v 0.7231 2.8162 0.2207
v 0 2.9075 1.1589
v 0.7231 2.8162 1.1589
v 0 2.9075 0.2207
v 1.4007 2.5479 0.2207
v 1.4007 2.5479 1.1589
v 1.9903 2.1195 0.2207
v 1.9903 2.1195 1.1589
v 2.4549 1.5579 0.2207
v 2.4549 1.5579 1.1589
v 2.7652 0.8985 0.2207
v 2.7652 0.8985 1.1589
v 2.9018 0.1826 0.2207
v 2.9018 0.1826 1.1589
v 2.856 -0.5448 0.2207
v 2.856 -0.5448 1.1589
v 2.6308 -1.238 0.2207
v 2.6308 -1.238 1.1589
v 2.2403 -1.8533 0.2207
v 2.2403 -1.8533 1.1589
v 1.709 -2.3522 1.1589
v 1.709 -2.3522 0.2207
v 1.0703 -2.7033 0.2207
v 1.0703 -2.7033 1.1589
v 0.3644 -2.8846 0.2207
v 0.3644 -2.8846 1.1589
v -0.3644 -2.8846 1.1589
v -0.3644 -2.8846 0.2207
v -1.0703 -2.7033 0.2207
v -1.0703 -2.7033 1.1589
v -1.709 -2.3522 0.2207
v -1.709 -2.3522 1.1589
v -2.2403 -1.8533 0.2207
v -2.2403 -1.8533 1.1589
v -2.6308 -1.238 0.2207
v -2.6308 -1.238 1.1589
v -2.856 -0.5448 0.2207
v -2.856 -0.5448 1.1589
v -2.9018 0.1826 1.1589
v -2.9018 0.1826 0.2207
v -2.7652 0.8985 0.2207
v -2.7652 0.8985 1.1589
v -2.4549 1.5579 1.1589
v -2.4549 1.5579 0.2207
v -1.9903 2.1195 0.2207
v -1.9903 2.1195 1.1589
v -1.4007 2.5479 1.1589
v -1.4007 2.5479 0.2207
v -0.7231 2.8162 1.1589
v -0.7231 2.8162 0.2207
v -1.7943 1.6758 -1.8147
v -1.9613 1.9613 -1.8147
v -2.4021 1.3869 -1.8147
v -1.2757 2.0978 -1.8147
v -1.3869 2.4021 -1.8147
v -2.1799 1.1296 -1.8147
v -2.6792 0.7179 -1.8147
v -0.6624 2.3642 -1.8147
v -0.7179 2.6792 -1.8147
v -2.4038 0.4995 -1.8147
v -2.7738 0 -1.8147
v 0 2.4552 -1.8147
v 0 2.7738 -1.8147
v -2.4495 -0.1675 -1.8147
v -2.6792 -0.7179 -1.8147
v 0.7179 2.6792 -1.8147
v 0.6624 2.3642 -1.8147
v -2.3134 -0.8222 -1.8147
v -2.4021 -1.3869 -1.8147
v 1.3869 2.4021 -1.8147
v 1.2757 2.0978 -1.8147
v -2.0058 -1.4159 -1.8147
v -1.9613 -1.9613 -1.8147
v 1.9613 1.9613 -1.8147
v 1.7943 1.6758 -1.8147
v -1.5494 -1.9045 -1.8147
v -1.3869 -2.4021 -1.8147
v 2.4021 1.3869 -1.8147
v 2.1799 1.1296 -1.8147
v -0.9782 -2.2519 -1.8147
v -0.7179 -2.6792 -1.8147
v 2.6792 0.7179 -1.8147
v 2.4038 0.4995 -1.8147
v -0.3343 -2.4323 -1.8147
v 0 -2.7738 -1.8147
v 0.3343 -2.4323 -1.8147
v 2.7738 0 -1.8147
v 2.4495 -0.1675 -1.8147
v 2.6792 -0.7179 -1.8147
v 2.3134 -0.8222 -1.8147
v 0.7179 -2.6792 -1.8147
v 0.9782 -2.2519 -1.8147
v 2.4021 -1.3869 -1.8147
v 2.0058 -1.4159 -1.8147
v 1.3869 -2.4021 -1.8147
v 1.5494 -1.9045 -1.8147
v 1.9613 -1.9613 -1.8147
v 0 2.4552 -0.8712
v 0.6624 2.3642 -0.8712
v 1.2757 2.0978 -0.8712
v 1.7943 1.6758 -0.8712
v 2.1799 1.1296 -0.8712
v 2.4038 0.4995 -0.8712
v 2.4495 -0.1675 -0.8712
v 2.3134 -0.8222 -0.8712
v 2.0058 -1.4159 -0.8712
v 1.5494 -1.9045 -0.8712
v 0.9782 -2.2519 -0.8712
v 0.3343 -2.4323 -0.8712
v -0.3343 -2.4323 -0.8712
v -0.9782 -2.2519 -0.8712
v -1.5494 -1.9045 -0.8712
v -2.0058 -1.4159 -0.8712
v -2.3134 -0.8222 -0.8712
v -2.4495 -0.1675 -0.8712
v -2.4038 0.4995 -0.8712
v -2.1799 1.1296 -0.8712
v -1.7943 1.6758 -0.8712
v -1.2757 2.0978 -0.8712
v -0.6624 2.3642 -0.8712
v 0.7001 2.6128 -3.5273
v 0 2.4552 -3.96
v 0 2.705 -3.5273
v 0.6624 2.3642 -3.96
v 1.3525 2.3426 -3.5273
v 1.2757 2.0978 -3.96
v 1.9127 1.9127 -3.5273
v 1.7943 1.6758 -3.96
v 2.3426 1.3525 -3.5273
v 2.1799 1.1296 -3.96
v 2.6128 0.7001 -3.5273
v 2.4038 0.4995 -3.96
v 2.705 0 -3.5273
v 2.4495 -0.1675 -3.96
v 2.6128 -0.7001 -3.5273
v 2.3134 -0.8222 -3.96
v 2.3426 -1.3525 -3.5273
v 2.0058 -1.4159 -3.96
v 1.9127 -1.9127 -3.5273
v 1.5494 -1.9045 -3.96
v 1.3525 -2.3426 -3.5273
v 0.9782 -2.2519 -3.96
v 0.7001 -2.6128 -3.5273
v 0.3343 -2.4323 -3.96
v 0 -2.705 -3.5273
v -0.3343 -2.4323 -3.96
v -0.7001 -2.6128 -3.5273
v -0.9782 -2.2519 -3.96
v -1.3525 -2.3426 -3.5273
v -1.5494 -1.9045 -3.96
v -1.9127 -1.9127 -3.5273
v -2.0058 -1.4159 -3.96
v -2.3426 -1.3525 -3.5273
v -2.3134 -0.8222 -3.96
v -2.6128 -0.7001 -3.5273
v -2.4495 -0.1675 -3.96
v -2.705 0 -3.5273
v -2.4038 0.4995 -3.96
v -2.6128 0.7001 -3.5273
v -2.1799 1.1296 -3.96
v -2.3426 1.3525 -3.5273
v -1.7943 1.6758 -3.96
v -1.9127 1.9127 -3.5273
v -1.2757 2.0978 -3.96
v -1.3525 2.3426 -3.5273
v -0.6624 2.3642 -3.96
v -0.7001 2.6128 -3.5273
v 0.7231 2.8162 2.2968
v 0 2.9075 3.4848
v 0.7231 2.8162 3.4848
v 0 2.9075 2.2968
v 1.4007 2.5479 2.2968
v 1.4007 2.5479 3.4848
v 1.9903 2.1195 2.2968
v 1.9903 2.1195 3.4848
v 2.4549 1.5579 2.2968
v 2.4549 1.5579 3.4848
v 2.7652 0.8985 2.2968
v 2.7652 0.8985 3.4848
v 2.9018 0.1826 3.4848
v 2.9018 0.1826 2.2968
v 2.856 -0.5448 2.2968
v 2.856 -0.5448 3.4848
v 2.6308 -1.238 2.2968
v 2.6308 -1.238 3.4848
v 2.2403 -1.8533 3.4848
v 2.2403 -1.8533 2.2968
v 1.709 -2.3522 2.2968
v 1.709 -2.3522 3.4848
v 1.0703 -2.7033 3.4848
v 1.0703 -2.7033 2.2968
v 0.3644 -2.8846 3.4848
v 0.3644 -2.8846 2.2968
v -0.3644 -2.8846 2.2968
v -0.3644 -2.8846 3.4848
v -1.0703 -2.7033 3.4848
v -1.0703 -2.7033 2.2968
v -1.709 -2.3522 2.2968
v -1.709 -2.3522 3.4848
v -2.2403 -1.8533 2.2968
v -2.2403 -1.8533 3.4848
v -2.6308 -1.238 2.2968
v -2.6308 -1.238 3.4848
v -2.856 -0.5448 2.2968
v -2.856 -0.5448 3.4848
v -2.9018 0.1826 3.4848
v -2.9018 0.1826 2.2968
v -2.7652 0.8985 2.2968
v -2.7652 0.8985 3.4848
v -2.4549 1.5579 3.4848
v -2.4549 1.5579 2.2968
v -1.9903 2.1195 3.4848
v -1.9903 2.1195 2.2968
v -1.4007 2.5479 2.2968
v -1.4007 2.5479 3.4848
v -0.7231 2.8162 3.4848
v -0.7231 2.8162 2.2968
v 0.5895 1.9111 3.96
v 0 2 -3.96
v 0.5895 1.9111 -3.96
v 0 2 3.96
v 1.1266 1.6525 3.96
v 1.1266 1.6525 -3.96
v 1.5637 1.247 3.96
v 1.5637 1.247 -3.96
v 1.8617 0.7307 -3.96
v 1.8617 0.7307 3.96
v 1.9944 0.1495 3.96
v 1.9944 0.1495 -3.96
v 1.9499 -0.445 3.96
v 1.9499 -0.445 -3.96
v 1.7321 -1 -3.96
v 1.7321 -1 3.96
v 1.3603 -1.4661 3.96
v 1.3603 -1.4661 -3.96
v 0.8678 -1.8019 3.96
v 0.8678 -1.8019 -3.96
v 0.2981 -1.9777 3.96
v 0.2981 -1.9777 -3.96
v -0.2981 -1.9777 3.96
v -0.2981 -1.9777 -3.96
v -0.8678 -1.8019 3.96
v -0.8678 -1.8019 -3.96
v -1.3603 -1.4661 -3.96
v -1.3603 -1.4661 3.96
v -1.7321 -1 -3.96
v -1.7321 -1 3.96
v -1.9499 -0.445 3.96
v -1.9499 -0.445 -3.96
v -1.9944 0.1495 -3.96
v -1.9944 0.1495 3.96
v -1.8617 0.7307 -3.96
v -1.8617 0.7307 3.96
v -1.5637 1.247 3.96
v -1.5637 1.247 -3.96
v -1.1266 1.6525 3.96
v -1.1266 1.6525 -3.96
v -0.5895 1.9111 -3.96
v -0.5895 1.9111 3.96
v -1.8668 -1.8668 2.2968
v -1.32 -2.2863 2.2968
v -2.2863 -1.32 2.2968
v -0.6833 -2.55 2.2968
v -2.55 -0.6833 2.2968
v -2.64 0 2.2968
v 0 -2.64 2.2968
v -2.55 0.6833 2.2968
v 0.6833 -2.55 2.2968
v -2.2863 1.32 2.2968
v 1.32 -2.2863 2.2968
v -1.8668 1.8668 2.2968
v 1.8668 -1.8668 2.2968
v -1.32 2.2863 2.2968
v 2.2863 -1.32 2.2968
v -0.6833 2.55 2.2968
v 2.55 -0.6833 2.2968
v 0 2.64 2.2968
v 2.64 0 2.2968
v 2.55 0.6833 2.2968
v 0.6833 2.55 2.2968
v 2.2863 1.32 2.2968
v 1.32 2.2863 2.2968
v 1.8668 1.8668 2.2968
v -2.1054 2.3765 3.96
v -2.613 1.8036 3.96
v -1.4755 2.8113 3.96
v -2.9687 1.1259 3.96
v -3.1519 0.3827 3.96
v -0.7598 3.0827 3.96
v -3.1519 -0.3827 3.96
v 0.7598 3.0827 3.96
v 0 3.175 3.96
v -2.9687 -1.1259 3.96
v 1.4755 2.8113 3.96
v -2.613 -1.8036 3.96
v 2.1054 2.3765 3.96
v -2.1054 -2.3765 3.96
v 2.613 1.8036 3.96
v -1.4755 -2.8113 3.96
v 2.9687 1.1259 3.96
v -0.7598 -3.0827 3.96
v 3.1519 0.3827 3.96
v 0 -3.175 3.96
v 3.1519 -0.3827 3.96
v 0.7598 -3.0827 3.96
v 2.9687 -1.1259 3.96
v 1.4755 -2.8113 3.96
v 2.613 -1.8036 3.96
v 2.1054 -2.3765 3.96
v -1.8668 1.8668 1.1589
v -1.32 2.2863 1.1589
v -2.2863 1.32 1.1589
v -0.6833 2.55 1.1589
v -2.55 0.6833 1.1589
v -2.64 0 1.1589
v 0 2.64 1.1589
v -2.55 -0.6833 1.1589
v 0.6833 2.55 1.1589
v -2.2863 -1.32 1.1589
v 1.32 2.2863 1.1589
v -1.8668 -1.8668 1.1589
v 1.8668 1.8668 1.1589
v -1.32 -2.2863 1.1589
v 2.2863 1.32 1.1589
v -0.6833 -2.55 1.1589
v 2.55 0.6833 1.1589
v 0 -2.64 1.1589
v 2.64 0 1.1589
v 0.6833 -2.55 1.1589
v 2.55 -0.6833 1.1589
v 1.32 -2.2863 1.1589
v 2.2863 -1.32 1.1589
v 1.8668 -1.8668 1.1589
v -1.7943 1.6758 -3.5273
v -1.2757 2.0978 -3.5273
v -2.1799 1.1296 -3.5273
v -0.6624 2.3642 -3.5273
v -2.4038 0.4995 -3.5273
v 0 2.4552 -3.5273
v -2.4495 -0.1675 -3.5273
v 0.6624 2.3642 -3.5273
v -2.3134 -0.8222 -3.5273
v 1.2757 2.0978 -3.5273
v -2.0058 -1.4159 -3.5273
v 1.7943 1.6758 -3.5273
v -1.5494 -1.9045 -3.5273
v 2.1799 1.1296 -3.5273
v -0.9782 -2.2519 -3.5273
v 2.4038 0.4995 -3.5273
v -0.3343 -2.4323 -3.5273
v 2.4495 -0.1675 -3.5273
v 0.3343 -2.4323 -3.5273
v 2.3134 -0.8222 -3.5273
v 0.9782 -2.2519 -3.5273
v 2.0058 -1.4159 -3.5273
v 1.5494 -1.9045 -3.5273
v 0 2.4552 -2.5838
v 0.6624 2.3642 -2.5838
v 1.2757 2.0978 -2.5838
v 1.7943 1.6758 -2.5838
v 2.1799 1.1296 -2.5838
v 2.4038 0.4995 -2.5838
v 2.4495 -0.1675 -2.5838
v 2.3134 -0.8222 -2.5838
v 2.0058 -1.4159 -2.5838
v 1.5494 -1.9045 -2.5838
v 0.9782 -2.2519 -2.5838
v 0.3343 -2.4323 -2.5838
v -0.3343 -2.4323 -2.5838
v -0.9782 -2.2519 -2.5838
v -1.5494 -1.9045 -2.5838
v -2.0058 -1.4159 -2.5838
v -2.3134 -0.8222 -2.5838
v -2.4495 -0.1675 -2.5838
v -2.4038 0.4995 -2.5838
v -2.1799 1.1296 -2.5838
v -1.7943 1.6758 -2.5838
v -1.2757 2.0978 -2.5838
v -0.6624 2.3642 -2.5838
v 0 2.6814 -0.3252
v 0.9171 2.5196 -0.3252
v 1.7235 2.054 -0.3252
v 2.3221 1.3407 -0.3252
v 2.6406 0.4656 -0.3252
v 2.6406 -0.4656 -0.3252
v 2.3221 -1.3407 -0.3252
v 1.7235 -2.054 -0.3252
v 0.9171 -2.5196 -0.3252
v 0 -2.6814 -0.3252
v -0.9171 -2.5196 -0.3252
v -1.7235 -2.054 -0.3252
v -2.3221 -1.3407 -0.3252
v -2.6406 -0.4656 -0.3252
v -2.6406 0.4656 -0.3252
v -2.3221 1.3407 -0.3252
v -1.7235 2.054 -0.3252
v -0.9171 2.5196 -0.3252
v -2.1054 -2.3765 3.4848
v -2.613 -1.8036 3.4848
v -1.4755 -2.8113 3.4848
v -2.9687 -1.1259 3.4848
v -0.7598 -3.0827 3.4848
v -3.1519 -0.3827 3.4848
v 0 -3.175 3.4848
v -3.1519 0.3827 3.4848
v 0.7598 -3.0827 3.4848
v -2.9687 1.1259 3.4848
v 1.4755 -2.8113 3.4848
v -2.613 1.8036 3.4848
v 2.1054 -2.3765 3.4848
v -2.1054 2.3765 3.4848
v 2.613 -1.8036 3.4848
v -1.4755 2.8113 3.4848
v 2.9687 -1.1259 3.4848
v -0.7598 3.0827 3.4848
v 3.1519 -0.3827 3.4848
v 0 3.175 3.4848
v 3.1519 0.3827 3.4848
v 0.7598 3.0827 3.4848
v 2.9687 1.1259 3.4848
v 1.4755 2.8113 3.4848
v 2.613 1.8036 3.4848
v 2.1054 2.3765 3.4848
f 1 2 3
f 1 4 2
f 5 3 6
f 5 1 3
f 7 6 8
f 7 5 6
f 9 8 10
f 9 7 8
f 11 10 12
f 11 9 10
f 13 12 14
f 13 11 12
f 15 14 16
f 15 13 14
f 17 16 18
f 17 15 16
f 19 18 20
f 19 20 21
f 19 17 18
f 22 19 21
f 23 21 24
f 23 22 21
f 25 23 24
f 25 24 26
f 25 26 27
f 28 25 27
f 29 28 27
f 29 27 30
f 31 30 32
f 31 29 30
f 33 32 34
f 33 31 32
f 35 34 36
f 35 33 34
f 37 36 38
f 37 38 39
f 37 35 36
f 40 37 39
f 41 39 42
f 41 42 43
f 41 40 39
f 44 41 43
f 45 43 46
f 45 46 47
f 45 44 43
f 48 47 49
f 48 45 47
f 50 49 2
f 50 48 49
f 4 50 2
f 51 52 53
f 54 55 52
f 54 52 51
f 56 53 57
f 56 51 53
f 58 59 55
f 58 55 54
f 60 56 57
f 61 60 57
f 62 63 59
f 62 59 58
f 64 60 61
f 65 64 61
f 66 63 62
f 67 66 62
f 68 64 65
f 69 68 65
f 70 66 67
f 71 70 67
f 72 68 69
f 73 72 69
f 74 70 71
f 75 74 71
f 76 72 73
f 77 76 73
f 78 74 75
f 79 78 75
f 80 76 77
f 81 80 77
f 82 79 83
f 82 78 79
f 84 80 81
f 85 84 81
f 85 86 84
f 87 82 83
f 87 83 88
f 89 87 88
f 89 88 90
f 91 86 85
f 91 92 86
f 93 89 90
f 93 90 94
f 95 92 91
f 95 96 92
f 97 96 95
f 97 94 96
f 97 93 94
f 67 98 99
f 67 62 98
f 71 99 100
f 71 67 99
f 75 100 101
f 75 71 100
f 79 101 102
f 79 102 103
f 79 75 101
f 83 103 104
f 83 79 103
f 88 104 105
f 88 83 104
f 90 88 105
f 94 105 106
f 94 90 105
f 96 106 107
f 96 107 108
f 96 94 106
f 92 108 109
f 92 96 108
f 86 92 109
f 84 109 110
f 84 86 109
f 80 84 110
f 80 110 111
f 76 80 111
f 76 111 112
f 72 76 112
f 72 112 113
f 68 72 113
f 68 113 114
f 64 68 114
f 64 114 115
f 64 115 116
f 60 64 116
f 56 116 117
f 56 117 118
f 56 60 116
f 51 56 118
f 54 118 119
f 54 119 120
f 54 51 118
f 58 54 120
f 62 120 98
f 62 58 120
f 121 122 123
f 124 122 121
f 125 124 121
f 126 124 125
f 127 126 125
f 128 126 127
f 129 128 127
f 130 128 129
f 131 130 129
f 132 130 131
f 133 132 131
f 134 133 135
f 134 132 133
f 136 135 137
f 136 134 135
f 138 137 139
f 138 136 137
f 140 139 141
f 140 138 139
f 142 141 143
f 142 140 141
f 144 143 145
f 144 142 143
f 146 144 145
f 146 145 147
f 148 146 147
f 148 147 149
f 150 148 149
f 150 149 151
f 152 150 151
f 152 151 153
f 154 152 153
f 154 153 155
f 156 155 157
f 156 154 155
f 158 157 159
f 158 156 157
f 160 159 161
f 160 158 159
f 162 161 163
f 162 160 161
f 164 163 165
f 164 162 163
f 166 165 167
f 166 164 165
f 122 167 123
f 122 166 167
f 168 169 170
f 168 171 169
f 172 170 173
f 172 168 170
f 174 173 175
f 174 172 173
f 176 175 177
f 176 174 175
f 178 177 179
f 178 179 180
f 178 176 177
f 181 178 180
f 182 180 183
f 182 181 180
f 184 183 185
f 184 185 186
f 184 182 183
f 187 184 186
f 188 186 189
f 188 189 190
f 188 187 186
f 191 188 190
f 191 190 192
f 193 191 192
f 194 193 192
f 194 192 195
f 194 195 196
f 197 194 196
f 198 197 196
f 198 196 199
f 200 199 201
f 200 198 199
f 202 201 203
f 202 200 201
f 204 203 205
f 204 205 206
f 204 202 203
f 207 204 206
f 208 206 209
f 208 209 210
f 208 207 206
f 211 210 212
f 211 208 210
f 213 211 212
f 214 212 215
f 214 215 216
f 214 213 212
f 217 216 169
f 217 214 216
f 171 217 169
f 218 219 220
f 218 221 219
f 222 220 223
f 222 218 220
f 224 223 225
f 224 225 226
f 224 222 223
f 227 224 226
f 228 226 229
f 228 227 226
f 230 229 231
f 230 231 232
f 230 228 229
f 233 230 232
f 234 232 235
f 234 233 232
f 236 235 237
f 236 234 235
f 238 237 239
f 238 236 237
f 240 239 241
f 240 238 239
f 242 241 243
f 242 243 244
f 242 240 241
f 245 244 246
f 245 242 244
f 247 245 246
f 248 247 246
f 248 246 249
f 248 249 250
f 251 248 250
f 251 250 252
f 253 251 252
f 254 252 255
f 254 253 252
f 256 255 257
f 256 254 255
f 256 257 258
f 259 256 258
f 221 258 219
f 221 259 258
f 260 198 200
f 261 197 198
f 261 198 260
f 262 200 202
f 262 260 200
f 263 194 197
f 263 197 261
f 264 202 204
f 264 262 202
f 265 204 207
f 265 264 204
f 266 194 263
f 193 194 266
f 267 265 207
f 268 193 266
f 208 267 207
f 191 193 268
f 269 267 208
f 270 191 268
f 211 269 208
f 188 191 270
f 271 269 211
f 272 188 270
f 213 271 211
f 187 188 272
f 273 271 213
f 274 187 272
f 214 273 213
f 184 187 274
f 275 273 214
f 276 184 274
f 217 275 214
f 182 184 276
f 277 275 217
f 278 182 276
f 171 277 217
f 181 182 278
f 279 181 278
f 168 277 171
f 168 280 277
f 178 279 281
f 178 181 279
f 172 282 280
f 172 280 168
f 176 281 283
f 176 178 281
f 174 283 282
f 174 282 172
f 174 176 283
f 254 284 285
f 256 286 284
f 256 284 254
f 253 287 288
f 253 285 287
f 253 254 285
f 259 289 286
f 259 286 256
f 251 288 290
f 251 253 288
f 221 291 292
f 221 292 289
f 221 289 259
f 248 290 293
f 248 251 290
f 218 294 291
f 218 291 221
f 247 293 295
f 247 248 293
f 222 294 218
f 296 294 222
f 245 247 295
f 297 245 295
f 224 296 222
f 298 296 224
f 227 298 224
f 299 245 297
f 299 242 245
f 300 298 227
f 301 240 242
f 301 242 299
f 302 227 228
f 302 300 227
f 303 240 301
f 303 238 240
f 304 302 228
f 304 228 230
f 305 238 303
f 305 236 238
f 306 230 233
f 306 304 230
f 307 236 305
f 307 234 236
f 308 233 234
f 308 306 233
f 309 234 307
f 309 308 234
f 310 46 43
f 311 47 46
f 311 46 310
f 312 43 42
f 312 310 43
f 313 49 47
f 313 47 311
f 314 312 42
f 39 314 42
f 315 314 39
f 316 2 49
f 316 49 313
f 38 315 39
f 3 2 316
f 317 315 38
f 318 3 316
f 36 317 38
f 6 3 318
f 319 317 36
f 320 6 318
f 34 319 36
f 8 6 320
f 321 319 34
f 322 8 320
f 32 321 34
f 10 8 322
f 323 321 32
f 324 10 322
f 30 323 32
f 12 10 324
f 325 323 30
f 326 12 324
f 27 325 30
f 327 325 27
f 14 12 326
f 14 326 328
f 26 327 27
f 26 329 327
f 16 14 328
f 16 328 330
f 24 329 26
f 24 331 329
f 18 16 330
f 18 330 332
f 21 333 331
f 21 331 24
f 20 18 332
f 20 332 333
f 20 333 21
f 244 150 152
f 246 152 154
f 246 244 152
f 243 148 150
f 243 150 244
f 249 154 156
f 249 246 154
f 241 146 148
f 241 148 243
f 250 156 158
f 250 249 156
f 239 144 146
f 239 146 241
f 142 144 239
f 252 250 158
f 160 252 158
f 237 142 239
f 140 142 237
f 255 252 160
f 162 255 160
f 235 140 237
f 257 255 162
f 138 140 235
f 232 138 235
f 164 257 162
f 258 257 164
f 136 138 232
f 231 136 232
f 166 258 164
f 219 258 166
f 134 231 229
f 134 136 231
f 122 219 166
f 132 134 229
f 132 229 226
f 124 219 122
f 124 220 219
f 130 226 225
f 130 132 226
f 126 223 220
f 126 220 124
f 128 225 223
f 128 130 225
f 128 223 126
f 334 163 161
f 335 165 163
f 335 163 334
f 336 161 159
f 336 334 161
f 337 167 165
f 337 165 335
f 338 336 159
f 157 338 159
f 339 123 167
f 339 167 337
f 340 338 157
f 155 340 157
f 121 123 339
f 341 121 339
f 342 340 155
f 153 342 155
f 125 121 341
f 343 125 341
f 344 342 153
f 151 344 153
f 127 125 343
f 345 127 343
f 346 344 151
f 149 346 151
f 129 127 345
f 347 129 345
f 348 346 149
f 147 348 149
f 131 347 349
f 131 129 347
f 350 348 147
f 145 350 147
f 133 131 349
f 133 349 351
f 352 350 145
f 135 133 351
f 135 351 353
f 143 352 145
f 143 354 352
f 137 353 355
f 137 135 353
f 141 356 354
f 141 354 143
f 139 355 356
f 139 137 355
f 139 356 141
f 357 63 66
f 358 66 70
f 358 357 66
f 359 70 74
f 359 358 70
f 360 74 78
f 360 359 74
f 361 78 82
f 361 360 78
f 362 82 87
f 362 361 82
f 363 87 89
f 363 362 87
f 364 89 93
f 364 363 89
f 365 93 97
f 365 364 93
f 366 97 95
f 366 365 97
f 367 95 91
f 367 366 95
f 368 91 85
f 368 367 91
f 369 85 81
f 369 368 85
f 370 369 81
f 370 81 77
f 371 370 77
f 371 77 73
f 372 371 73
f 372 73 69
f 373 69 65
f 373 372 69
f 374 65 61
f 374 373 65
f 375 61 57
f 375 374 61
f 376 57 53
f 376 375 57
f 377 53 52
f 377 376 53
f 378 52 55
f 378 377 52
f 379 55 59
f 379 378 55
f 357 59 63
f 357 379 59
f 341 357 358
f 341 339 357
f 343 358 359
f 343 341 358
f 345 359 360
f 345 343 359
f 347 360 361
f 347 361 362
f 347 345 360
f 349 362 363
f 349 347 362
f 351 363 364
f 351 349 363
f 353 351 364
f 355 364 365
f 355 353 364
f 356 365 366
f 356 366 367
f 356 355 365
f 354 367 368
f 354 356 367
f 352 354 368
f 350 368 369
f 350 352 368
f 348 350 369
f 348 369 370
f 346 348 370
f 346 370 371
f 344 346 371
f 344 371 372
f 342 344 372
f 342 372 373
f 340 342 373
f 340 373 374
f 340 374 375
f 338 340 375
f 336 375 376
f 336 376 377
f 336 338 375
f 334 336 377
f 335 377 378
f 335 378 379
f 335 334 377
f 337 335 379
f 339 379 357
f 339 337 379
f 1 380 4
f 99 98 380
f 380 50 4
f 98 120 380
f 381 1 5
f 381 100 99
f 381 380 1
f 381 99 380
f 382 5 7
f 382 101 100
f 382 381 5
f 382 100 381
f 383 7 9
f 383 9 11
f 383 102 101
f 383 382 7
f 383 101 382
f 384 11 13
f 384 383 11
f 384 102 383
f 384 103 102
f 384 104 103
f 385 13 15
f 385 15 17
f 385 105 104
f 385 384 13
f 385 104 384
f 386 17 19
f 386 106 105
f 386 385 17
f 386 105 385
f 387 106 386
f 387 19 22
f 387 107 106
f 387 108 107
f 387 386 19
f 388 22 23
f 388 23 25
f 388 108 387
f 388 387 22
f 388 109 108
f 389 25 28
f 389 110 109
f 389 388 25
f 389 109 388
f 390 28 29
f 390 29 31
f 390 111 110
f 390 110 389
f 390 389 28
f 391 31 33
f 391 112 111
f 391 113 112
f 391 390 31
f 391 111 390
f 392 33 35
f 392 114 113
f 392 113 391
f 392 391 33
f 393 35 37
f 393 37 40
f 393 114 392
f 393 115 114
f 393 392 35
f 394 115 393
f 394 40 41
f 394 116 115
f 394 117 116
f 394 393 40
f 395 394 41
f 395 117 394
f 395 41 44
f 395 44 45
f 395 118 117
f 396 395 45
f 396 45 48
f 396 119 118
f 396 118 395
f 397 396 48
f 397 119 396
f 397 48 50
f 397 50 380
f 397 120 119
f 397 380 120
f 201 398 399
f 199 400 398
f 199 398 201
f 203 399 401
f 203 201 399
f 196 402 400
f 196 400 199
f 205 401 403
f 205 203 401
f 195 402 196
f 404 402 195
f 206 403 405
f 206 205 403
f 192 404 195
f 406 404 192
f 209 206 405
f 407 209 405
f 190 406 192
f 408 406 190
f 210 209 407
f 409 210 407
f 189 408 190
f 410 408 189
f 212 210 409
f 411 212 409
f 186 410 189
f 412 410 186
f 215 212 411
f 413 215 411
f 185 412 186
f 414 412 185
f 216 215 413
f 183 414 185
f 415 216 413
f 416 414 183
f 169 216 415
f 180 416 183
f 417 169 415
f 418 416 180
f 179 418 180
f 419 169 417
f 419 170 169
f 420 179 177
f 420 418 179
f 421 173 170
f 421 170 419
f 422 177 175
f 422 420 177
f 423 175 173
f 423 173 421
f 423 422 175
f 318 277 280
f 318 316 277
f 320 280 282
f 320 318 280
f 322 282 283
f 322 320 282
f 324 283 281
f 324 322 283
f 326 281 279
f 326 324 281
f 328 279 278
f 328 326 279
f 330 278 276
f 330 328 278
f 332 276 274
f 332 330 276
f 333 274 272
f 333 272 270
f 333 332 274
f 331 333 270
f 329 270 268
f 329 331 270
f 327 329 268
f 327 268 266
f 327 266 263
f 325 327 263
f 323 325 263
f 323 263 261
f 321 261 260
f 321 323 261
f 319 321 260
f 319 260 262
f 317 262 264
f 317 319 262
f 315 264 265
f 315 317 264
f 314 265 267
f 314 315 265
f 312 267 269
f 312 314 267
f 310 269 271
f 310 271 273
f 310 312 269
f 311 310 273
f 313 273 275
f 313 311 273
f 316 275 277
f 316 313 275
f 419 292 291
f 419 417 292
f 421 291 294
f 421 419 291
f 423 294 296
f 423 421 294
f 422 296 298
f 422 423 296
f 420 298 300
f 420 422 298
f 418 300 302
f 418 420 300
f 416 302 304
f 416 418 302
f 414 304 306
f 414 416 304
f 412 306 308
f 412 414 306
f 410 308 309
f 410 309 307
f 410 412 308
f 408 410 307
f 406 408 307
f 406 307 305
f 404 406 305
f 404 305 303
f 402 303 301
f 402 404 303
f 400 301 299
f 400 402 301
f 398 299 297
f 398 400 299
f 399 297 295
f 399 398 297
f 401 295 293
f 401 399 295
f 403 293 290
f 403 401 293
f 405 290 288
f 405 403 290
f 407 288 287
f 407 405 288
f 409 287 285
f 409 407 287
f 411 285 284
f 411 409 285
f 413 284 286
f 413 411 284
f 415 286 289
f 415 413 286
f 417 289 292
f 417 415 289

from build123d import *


with BuildPart() as part:
    # Sketch3 → Revolve1 (revolve)
    with BuildSketch(Plane(origin=(0, 0, 0), x_dir=(0, 0, -1), z_dir=(1, 0, 0))):
        Polygon((-3.96, 2), (-3.96, 3.175), (-3.4848, 3.175), (-3.4848, 2.9075), (-2.2968, 2.9075), (-2.2968, 2.64), (-1.158946666, 2.64), (-1.158946666, 2.9075), (-0.220748794, 2.9075), (0.8712, 2.4552), (1.814742989, 2.4552), (1.814742989, 2.77375), (2.583790719, 2.4552), (3.527333708, 2.4552), (3.527333708, 2.705), (3.96, 2.4552), (3.96, 2), align=None)
    revolve(axis=Axis((0, 0, 3.96), (0, 0, -1)))


solid = part.part
